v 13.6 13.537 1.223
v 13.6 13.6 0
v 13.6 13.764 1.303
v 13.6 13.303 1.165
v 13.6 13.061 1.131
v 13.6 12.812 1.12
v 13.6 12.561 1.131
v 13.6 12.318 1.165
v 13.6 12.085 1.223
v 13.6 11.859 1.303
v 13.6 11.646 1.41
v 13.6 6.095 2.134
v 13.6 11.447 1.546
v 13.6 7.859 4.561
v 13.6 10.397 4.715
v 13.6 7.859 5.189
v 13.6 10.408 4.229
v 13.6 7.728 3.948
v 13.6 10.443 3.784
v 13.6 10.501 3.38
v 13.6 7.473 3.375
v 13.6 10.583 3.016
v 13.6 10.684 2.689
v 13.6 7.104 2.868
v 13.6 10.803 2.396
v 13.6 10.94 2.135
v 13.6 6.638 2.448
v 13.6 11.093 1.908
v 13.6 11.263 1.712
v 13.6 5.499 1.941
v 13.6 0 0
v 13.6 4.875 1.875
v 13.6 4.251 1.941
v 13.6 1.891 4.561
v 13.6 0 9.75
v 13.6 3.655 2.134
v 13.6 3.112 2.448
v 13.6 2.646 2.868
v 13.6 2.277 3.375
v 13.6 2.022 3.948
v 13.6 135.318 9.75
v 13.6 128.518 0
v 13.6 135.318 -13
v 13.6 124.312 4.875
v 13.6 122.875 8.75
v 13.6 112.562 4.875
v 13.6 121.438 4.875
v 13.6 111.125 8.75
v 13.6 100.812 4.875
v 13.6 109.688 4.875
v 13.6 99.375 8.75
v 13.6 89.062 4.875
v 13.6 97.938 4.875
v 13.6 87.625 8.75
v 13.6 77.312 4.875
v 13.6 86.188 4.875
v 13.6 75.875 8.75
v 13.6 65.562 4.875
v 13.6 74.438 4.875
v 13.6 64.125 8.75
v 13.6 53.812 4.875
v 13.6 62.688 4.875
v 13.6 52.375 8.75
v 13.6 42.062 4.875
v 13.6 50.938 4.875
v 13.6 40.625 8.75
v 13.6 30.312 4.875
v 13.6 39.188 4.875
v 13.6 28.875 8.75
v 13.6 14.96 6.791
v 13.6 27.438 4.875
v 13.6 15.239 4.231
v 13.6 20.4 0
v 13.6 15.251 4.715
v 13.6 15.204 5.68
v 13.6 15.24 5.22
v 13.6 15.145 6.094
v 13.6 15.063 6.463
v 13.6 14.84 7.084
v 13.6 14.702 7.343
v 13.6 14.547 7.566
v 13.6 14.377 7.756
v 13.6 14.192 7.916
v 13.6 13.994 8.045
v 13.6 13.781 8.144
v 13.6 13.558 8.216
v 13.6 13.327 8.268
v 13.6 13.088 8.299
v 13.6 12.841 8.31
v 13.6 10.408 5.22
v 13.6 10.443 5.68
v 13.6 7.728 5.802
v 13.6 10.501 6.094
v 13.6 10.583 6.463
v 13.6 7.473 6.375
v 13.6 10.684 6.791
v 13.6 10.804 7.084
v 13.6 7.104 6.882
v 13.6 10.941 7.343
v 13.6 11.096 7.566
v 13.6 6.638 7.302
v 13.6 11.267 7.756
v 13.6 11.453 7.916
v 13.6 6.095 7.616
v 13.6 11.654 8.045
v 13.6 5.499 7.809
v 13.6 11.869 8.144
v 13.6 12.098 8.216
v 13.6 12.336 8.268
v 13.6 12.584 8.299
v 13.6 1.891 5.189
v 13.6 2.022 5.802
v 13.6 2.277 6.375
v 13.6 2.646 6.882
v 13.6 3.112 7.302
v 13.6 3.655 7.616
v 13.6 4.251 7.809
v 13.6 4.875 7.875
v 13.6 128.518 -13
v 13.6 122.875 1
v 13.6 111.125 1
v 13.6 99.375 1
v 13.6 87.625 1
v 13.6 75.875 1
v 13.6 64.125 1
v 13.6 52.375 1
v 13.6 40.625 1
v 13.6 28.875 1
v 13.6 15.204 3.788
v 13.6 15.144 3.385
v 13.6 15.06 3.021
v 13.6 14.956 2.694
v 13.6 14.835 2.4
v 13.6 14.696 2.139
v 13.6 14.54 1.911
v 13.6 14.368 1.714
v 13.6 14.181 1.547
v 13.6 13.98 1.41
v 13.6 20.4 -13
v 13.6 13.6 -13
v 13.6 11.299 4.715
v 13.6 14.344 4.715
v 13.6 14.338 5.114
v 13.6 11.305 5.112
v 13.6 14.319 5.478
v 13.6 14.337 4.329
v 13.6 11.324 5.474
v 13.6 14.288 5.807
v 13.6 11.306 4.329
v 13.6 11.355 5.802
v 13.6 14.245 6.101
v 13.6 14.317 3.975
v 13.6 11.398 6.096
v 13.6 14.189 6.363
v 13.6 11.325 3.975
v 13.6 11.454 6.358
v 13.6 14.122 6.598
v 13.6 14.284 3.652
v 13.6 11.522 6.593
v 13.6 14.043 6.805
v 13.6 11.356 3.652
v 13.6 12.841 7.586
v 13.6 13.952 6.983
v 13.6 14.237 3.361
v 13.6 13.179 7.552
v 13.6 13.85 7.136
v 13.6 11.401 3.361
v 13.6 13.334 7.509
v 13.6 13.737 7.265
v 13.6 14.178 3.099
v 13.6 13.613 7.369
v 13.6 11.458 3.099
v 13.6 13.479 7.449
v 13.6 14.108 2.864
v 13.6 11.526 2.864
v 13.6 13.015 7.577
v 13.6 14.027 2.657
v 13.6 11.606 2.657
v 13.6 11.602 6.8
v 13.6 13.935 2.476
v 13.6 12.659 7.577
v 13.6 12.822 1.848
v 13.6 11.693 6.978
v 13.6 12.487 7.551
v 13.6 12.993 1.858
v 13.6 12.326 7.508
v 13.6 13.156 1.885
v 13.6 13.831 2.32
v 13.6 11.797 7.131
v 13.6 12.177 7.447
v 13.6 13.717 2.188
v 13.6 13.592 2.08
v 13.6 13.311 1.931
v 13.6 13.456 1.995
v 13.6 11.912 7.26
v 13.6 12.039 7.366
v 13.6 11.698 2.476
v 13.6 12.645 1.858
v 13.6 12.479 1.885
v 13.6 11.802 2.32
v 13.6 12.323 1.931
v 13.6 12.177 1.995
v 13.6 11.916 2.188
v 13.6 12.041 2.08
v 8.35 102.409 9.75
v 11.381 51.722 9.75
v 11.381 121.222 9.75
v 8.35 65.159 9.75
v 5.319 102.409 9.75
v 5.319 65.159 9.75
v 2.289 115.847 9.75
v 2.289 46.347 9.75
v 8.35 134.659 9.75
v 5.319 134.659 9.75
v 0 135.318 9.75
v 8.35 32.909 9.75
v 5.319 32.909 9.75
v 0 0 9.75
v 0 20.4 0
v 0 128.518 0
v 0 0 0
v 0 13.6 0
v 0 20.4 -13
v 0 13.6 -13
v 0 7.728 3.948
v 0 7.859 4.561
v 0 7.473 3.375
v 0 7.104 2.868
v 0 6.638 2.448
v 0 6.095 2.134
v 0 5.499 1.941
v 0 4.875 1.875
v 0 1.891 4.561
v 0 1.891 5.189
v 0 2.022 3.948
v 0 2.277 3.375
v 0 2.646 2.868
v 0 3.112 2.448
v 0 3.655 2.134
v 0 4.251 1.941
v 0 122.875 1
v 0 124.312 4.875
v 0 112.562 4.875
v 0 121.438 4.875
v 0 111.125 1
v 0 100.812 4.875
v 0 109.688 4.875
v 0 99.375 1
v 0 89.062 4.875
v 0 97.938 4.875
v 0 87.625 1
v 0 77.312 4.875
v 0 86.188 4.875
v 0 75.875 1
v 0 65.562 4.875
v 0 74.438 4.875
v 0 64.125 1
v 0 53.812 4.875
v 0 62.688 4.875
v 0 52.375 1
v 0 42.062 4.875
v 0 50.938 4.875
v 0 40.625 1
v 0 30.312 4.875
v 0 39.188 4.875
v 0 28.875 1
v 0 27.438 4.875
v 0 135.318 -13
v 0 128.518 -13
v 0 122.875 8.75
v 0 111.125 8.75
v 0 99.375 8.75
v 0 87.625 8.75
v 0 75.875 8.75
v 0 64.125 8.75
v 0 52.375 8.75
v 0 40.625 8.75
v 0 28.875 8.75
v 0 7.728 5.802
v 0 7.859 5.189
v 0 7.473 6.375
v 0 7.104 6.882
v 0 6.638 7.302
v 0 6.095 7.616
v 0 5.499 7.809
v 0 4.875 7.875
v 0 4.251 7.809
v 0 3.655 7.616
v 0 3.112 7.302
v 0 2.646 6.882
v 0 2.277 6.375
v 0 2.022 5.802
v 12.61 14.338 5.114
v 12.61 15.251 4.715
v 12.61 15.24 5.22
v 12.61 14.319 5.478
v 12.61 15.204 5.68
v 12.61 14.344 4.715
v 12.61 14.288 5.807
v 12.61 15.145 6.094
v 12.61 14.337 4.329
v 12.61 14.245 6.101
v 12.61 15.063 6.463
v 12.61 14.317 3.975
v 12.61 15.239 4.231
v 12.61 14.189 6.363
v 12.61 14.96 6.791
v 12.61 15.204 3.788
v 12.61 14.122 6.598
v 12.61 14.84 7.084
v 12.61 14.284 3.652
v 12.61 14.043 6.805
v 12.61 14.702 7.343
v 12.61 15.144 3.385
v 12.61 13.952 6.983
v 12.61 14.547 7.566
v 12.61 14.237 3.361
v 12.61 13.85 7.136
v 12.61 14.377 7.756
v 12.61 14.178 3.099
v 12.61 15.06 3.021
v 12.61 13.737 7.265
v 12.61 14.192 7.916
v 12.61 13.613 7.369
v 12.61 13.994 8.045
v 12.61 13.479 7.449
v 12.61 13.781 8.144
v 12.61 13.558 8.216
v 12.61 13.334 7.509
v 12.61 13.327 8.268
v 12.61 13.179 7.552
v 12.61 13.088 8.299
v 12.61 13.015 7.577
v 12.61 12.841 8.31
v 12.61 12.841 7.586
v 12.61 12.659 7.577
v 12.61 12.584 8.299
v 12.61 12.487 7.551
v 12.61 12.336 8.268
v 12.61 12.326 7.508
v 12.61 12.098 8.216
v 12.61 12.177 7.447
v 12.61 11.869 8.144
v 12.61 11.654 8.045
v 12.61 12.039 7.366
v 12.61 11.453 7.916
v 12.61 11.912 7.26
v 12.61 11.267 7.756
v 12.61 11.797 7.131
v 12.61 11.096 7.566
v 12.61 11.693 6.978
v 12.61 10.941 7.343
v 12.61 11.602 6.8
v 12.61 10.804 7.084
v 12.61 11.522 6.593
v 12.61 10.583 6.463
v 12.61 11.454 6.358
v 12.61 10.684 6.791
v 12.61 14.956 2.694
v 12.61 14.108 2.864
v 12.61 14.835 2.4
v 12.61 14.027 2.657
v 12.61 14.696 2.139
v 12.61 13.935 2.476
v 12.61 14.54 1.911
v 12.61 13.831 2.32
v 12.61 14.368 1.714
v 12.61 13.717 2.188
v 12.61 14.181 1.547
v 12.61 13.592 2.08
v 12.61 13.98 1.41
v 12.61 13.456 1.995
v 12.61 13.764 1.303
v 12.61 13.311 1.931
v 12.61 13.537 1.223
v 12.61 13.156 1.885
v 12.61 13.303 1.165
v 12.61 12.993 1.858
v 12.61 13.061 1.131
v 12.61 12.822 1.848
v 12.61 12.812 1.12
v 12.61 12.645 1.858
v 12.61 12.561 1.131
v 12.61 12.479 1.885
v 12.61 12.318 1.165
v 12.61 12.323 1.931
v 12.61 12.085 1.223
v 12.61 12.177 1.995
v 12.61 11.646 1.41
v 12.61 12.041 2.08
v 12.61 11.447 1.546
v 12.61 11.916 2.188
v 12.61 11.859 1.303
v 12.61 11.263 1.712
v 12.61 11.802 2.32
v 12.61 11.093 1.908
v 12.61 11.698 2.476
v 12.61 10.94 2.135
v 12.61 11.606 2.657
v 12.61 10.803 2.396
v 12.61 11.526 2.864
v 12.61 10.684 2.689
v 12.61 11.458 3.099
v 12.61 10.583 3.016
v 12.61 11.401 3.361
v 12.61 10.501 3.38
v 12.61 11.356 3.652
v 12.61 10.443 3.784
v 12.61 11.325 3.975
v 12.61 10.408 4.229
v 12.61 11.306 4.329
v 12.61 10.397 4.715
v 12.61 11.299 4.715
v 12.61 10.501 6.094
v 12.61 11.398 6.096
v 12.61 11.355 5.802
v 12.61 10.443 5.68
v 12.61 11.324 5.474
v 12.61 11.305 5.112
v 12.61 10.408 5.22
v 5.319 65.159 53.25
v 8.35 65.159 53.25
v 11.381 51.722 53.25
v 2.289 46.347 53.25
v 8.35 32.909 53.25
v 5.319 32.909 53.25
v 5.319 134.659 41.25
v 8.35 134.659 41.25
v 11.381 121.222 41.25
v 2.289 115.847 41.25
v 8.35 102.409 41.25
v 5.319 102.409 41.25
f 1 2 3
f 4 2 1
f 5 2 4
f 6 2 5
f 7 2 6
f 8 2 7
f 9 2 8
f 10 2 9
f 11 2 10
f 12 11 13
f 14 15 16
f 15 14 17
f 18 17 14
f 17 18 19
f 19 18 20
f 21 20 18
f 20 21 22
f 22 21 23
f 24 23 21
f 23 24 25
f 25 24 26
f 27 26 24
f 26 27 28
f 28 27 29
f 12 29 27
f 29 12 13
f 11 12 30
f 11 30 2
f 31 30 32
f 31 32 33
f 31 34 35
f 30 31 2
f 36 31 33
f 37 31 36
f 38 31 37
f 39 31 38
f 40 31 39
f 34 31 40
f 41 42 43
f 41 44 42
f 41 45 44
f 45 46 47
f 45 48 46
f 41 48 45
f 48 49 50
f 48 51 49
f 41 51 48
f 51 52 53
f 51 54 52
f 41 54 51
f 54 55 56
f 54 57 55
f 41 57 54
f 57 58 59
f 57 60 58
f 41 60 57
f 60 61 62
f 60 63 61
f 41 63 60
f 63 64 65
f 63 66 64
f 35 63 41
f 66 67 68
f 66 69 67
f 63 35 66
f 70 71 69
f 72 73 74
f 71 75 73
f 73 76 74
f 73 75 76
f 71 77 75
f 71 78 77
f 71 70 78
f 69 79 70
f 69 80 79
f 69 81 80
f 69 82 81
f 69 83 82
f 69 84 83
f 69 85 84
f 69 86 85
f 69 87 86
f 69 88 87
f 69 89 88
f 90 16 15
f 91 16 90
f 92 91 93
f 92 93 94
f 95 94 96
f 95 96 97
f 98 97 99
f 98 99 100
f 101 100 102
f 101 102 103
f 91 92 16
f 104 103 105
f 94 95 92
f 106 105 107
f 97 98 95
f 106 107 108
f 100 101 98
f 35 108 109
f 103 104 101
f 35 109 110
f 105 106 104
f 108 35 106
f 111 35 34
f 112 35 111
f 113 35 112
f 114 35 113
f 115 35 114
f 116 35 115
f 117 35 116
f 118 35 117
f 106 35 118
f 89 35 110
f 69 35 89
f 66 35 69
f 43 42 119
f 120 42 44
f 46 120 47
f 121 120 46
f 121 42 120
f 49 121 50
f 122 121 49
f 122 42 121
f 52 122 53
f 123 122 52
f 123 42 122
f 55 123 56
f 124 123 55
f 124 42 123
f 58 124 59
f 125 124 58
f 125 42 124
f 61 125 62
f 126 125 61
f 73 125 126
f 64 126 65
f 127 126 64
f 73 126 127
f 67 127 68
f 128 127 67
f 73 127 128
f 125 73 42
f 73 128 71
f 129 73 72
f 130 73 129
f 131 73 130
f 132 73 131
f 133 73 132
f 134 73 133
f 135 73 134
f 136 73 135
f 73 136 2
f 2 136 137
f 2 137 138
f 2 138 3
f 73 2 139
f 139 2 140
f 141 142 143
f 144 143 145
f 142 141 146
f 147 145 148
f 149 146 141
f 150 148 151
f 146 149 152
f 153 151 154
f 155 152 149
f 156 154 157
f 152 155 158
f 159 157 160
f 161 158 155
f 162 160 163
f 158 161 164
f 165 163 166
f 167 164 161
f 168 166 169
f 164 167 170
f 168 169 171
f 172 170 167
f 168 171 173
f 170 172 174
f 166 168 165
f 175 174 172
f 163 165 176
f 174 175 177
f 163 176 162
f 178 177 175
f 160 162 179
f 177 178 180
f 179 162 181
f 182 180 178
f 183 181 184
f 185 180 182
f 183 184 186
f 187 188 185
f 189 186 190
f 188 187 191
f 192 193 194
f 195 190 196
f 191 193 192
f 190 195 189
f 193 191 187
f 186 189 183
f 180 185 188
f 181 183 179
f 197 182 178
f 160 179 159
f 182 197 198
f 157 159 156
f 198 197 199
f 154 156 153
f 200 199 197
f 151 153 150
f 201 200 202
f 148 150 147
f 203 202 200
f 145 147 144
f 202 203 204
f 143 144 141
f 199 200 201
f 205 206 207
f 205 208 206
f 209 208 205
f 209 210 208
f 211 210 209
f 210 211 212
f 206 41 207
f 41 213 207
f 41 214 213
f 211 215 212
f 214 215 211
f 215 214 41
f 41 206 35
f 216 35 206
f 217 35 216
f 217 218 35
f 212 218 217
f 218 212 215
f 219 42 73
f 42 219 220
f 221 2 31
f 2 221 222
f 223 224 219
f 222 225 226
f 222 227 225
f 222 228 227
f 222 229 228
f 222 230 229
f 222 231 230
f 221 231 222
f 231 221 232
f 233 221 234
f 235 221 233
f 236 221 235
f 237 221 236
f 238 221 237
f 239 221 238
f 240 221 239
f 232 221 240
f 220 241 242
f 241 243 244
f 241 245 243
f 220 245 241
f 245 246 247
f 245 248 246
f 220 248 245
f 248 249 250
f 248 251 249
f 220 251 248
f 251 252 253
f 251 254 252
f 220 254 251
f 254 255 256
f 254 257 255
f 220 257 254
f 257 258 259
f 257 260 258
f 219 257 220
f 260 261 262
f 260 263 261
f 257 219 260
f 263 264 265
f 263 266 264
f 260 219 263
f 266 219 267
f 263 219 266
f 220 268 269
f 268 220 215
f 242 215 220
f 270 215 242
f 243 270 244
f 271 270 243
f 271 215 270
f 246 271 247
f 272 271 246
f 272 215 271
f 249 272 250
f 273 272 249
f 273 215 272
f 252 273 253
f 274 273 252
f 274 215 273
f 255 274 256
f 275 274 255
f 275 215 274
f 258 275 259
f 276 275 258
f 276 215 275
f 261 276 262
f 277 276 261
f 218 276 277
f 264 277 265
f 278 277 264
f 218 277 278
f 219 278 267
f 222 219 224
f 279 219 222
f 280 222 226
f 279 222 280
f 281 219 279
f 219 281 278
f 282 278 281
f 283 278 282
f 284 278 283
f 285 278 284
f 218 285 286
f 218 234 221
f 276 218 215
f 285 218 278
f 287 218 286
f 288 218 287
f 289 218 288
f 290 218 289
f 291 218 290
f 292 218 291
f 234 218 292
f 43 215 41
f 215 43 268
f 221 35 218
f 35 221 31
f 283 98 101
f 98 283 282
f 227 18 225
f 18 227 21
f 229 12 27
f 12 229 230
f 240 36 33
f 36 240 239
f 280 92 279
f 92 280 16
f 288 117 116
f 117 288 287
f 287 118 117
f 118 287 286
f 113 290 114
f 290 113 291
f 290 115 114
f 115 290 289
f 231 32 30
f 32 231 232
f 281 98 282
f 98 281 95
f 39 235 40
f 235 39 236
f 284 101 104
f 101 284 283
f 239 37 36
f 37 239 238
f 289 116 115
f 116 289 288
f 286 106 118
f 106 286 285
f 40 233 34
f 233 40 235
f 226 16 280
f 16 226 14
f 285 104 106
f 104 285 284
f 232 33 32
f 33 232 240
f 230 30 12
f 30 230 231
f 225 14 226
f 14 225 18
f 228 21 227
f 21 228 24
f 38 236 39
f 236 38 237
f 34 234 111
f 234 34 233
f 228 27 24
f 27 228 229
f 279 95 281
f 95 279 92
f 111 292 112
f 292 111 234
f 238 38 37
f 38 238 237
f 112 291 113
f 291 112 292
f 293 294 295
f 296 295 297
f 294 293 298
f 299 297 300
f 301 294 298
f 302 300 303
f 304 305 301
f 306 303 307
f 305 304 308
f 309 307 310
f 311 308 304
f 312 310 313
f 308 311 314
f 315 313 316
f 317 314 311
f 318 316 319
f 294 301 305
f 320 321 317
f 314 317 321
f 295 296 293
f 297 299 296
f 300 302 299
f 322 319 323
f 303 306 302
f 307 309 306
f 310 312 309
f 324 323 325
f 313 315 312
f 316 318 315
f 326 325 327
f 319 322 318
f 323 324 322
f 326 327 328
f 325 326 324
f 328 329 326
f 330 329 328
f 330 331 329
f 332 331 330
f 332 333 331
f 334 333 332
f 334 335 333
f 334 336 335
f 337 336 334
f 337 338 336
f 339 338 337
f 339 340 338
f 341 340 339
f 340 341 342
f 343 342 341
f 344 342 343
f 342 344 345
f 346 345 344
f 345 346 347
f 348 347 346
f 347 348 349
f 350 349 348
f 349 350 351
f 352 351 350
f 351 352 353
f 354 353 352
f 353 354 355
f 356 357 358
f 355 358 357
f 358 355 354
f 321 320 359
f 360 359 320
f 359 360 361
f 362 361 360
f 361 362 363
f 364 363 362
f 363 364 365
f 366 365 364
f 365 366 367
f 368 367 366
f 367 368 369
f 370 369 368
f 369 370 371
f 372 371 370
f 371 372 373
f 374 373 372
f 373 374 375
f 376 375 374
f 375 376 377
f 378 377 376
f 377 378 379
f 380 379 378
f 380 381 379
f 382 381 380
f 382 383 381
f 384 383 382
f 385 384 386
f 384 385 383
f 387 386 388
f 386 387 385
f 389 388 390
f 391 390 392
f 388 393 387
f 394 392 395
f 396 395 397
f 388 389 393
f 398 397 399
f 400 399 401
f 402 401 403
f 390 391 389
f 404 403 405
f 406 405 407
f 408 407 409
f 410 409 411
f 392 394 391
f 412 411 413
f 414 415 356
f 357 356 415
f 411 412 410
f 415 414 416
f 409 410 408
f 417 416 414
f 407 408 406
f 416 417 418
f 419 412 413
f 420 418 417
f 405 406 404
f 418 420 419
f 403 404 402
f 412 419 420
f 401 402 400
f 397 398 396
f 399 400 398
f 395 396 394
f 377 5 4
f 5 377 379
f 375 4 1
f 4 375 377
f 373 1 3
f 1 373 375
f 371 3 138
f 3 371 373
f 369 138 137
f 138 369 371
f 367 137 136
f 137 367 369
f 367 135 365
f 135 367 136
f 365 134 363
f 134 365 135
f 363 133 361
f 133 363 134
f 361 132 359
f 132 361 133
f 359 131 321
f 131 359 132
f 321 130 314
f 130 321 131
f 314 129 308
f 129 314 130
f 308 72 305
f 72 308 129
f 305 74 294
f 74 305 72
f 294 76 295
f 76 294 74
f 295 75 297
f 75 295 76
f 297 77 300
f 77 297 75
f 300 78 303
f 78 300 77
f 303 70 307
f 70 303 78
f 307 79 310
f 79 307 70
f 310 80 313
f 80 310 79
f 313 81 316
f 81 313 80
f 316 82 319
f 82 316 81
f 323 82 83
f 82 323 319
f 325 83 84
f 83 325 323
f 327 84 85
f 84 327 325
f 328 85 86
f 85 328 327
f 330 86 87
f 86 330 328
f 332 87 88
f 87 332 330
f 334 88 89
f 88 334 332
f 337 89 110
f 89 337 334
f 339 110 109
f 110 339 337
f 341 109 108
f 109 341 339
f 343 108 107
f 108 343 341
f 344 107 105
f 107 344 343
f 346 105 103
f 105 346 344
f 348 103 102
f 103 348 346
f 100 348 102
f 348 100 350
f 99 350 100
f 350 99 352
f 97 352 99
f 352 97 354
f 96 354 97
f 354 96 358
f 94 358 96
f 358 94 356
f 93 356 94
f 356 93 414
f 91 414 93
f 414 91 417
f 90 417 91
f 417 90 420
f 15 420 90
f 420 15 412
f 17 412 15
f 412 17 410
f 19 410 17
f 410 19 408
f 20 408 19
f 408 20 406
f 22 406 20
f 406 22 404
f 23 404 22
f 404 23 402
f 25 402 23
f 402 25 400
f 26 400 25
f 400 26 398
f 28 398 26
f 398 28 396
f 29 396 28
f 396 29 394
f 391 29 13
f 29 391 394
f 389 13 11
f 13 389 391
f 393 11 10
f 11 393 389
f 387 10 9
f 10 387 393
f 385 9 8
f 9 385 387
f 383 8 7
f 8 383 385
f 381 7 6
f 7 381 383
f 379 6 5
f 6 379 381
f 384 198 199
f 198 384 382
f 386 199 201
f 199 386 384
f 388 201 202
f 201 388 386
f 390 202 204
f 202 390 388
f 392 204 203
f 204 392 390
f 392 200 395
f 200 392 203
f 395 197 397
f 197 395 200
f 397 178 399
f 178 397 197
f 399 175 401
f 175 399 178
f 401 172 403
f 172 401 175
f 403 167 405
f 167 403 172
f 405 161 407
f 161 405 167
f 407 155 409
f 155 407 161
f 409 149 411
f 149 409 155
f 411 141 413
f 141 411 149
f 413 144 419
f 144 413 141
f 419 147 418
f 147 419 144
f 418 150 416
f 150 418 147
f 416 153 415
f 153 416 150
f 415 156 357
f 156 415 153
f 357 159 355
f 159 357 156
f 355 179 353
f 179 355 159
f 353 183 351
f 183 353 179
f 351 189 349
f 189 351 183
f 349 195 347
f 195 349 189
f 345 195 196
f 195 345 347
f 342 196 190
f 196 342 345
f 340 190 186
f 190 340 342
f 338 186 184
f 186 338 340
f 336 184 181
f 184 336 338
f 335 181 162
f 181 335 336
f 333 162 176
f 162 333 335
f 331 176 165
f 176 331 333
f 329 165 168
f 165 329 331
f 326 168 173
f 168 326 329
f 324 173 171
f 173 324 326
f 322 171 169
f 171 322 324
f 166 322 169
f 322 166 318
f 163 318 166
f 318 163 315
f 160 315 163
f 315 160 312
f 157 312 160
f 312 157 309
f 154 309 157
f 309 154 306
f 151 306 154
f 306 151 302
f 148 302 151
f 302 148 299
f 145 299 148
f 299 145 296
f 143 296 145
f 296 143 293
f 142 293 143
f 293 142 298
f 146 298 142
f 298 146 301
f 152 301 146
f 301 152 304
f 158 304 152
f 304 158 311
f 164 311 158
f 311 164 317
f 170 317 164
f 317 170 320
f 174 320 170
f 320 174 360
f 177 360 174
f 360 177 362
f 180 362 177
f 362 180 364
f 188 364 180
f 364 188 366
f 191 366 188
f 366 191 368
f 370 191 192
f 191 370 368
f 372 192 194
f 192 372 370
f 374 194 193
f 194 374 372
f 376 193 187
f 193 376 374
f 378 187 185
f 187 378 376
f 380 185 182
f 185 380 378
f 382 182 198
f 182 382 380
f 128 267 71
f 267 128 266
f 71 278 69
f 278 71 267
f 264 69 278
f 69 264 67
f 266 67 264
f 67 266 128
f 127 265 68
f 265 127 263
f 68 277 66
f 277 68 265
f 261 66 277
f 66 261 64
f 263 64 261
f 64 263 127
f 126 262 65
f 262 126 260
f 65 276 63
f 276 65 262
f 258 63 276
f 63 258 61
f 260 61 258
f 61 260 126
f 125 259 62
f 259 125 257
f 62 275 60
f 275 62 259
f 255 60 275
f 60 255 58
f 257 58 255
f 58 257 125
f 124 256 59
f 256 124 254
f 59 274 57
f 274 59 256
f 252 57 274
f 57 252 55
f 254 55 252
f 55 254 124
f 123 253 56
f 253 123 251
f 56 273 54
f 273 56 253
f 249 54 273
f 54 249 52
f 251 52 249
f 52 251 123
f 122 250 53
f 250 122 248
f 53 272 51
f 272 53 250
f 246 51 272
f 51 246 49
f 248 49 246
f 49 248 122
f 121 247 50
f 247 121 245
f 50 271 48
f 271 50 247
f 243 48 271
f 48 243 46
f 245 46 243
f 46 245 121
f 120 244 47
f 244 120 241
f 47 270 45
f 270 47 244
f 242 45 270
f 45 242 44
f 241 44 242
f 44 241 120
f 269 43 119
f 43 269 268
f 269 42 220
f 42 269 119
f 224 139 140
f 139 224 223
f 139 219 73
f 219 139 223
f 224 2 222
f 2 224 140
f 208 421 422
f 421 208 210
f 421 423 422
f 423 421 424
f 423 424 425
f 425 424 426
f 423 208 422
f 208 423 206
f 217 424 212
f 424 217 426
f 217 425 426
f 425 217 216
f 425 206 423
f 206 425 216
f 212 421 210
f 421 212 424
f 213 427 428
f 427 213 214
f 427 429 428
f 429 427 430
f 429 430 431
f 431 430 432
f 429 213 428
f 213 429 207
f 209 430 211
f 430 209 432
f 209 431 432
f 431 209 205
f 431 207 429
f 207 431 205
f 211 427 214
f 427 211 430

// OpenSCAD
// file: values.scad
$fs=0.1;
//Constants:
edgeRadius=1.5;
underKeyWidth=13.6;
baseHeight=9.75;
genh=5.791666666666667;
a=27.423996629776394;
b=12.370392724366756;
c=12.370392724366756;
d=38.393595281686956;
overhead=65.81759191146335;
keyTravelDistance=13.0;
desiredGamut=24;
shift=3.092598181091689;
holeScale=0.5;
stalkScale=0.48;

Points = [
[shift,a,0],//0
[(b-shift),0,0],//1
[(b+shift),0,0],//2
[(b+c-shift),d,0],//3
[(c+shift),(a+d),0],//4
[(c-shift),(a+d),0],//5
[shift,a,keyTravelDistance],//6
[(b-shift),0,keyTravelDistance],//7
[(b+shift),0,keyTravelDistance],//8
[(b+c-shift),d,keyTravelDistance],//9
[(c+shift),(a+d),keyTravelDistance],//10
[(c-shift),(a+d),keyTravelDistance],//11
];
Faces = [
[0,1,2,3,4,5],
[1,0,6,7],
[2,1,7,8],
[3,2,8,9],
[4,3,9,10],
[5,4,10,11],
[0,5,11,6],
[11,10,9,8,7,6] 
];
// file: keytop.scad
include<values.scad>;
keytop();

module keytopShape(){
polyhedron(Points,Faces);
}
module keytop(){
difference(){
keytopShape();
translate([(b+c)/4,(d+a)/4,-0.1])
scale(holeScale,holeScale,holeScale)
keytopShape();
edge(6,11,1,-1);
edge(6,7,1,1);
edge(7,8,1,1);
edge(8,9,1,1);
edge(9,10,1,-1,-1);
edge(10,11,1,-1);
}
module edge (point1,point2,d1,d2,d3=1){
difference(){
translate([Points[point1][0],Points[point1][1],Points[point1][2]])
rotate([0,90,atan((Points[point2][1]-Points[point1][1])/(Points[point2][0]-Points[point1][0]))])
translate([0,0,d3*30])
rotate(45,0,0)
cube([pow(2*(edgeRadius*edgeRadius),1/2),pow(2*(edgeRadius*edgeRadius),1/2),90],true);
translate([Points[point1][0],Points[point1][1],Points[point1][2]])
rotate([0,90,atan((Points[point2][1]-Points[point1][1])/(Points[point2][0]-Points[point1][0]))])
translate([d1*edgeRadius,d2*edgeRadius,d3*30])
cylinder(90,edgeRadius,edgeRadius, true);
}
}

}
// main file
use<keytop.scad>
include<values.scad>
rotate([0,90,0])0_0();
module 0_0(keytops=false){
length=135.31759191146335;
rotate([0,-90,0]){
//Main Base:
difference(){
cube([underKeyWidth,length,baseHeight],false);
translate([-.1,0.5*baseHeight,0.5*baseHeight])rotate([0,90,0])
cylinder((underKeyWidth+.2),r=3, false);
translate([underKeyWidth-.99,10,0.125*baseHeight])
rotate([90,0,90])
linear_extrude(height=1){
text("0",size=baseHeight*0.75);
}

//Warp Cuts:
translate([-1,0.0+25+0.25*baseHeight,baseHeight-1])
rotate([0,90,0])
linear_extrude(height=underKeyWidth+2)
polygon(points=[[0.5*baseHeight-1,0],[baseHeight-2,0.25*baseHeight-1],[0.5*baseHeight-1,0.5*baseHeight-2],[0,0.25*baseHeight-1]]);
translate([-1,11.75+25+0.25*baseHeight,baseHeight-1])
rotate([0,90,0])
linear_extrude(height=underKeyWidth+2)
polygon(points=[[0.5*baseHeight-1,0],[baseHeight-2,0.25*baseHeight-1],[0.5*baseHeight-1,0.5*baseHeight-2],[0,0.25*baseHeight-1]]);
translate([-1,23.5+25+0.25*baseHeight,baseHeight-1])
rotate([0,90,0])
linear_extrude(height=underKeyWidth+2)
polygon(points=[[0.5*baseHeight-1,0],[baseHeight-2,0.25*baseHeight-1],[0.5*baseHeight-1,0.5*baseHeight-2],[0,0.25*baseHeight-1]]);
translate([-1,35.25+25+0.25*baseHeight,baseHeight-1])
rotate([0,90,0])
linear_extrude(height=underKeyWidth+2)
polygon(points=[[0.5*baseHeight-1,0],[baseHeight-2,0.25*baseHeight-1],[0.5*baseHeight-1,0.5*baseHeight-2],[0,0.25*baseHeight-1]]);
translate([-1,47.0+25+0.25*baseHeight,baseHeight-1])
rotate([0,90,0])
linear_extrude(height=underKeyWidth+2)
polygon(points=[[0.5*baseHeight-1,0],[baseHeight-2,0.25*baseHeight-1],[0.5*baseHeight-1,0.5*baseHeight-2],[0,0.25*baseHeight-1]]);
translate([-1,58.75+25+0.25*baseHeight,baseHeight-1])
rotate([0,90,0])
linear_extrude(height=underKeyWidth+2)
polygon(points=[[0.5*baseHeight-1,0],[baseHeight-2,0.25*baseHeight-1],[0.5*baseHeight-1,0.5*baseHeight-2],[0,0.25*baseHeight-1]]);
translate([-1,70.5+25+0.25*baseHeight,baseHeight-1])
rotate([0,90,0])
linear_extrude(height=underKeyWidth+2)
polygon(points=[[0.5*baseHeight-1,0],[baseHeight-2,0.25*baseHeight-1],[0.5*baseHeight-1,0.5*baseHeight-2],[0,0.25*baseHeight-1]]);
translate([-1,82.25+25+0.25*baseHeight,baseHeight-1])
rotate([0,90,0])
linear_extrude(height=underKeyWidth+2)
polygon(points=[[0.5*baseHeight-1,0],[baseHeight-2,0.25*baseHeight-1],[0.5*baseHeight-1,0.5*baseHeight-2],[0,0.25*baseHeight-1]]);
translate([-1,94.0+25+0.25*baseHeight,baseHeight-1])
rotate([0,90,0])
linear_extrude(height=underKeyWidth+2)
polygon(points=[[0.5*baseHeight-1,0],[baseHeight-2,0.25*baseHeight-1],[0.5*baseHeight-1,0.5*baseHeight-2],[0,0.25*baseHeight-1]]);
}
//Key Stalks:
translate([shift/4,(genh*0-(d+a)/2+overhead),baseHeight]){
linear_extrude(height=(keyTravelDistance*1.5+desiredGamut-0)){
scale((stalkScale+holeScale)/2,stalkScale)
polygon(points=[
[Points[0][0],Points[0][1]],[Points[1][0],Points[1][1]],[Points[2][0],Points[2][1]],[Points[3][0],Points[3][1]],[Points[4][0],Points[4][1]],[Points[5][0],Points[5][1]],[Points[6][0],Points[6][1]]
]);
}
if(keytops)
translate([0,(-0.5*(a+d)),(keyTravelDistance*1.5+desiredGamut-0+40)])
keytop();
}
translate([shift/4,(genh*12-(d+a)/2+overhead),baseHeight]){
linear_extrude(height=(keyTravelDistance*1.5+desiredGamut-12)){
scale((stalkScale+holeScale)/2,stalkScale)
polygon(points=[
[Points[0][0],Points[0][1]],[Points[1][0],Points[1][1]],[Points[2][0],Points[2][1]],[Points[3][0],Points[3][1]],[Points[4][0],Points[4][1]],[Points[5][0],Points[5][1]],[Points[6][0],Points[6][1]]
]);
}
if(keytops)
translate([0,(-0.5*(a+d)),(keyTravelDistance*1.5+desiredGamut-12+40)])
keytop();
}
//Feet:
difference(){union(){translate([0,128.51759191146334,-13.0]){
cube([13.6,6.8,13.0],false);}
translate([0,13.6,-13.0]){
cube([13.6,6.8,13.0],false);}}
}
}}
